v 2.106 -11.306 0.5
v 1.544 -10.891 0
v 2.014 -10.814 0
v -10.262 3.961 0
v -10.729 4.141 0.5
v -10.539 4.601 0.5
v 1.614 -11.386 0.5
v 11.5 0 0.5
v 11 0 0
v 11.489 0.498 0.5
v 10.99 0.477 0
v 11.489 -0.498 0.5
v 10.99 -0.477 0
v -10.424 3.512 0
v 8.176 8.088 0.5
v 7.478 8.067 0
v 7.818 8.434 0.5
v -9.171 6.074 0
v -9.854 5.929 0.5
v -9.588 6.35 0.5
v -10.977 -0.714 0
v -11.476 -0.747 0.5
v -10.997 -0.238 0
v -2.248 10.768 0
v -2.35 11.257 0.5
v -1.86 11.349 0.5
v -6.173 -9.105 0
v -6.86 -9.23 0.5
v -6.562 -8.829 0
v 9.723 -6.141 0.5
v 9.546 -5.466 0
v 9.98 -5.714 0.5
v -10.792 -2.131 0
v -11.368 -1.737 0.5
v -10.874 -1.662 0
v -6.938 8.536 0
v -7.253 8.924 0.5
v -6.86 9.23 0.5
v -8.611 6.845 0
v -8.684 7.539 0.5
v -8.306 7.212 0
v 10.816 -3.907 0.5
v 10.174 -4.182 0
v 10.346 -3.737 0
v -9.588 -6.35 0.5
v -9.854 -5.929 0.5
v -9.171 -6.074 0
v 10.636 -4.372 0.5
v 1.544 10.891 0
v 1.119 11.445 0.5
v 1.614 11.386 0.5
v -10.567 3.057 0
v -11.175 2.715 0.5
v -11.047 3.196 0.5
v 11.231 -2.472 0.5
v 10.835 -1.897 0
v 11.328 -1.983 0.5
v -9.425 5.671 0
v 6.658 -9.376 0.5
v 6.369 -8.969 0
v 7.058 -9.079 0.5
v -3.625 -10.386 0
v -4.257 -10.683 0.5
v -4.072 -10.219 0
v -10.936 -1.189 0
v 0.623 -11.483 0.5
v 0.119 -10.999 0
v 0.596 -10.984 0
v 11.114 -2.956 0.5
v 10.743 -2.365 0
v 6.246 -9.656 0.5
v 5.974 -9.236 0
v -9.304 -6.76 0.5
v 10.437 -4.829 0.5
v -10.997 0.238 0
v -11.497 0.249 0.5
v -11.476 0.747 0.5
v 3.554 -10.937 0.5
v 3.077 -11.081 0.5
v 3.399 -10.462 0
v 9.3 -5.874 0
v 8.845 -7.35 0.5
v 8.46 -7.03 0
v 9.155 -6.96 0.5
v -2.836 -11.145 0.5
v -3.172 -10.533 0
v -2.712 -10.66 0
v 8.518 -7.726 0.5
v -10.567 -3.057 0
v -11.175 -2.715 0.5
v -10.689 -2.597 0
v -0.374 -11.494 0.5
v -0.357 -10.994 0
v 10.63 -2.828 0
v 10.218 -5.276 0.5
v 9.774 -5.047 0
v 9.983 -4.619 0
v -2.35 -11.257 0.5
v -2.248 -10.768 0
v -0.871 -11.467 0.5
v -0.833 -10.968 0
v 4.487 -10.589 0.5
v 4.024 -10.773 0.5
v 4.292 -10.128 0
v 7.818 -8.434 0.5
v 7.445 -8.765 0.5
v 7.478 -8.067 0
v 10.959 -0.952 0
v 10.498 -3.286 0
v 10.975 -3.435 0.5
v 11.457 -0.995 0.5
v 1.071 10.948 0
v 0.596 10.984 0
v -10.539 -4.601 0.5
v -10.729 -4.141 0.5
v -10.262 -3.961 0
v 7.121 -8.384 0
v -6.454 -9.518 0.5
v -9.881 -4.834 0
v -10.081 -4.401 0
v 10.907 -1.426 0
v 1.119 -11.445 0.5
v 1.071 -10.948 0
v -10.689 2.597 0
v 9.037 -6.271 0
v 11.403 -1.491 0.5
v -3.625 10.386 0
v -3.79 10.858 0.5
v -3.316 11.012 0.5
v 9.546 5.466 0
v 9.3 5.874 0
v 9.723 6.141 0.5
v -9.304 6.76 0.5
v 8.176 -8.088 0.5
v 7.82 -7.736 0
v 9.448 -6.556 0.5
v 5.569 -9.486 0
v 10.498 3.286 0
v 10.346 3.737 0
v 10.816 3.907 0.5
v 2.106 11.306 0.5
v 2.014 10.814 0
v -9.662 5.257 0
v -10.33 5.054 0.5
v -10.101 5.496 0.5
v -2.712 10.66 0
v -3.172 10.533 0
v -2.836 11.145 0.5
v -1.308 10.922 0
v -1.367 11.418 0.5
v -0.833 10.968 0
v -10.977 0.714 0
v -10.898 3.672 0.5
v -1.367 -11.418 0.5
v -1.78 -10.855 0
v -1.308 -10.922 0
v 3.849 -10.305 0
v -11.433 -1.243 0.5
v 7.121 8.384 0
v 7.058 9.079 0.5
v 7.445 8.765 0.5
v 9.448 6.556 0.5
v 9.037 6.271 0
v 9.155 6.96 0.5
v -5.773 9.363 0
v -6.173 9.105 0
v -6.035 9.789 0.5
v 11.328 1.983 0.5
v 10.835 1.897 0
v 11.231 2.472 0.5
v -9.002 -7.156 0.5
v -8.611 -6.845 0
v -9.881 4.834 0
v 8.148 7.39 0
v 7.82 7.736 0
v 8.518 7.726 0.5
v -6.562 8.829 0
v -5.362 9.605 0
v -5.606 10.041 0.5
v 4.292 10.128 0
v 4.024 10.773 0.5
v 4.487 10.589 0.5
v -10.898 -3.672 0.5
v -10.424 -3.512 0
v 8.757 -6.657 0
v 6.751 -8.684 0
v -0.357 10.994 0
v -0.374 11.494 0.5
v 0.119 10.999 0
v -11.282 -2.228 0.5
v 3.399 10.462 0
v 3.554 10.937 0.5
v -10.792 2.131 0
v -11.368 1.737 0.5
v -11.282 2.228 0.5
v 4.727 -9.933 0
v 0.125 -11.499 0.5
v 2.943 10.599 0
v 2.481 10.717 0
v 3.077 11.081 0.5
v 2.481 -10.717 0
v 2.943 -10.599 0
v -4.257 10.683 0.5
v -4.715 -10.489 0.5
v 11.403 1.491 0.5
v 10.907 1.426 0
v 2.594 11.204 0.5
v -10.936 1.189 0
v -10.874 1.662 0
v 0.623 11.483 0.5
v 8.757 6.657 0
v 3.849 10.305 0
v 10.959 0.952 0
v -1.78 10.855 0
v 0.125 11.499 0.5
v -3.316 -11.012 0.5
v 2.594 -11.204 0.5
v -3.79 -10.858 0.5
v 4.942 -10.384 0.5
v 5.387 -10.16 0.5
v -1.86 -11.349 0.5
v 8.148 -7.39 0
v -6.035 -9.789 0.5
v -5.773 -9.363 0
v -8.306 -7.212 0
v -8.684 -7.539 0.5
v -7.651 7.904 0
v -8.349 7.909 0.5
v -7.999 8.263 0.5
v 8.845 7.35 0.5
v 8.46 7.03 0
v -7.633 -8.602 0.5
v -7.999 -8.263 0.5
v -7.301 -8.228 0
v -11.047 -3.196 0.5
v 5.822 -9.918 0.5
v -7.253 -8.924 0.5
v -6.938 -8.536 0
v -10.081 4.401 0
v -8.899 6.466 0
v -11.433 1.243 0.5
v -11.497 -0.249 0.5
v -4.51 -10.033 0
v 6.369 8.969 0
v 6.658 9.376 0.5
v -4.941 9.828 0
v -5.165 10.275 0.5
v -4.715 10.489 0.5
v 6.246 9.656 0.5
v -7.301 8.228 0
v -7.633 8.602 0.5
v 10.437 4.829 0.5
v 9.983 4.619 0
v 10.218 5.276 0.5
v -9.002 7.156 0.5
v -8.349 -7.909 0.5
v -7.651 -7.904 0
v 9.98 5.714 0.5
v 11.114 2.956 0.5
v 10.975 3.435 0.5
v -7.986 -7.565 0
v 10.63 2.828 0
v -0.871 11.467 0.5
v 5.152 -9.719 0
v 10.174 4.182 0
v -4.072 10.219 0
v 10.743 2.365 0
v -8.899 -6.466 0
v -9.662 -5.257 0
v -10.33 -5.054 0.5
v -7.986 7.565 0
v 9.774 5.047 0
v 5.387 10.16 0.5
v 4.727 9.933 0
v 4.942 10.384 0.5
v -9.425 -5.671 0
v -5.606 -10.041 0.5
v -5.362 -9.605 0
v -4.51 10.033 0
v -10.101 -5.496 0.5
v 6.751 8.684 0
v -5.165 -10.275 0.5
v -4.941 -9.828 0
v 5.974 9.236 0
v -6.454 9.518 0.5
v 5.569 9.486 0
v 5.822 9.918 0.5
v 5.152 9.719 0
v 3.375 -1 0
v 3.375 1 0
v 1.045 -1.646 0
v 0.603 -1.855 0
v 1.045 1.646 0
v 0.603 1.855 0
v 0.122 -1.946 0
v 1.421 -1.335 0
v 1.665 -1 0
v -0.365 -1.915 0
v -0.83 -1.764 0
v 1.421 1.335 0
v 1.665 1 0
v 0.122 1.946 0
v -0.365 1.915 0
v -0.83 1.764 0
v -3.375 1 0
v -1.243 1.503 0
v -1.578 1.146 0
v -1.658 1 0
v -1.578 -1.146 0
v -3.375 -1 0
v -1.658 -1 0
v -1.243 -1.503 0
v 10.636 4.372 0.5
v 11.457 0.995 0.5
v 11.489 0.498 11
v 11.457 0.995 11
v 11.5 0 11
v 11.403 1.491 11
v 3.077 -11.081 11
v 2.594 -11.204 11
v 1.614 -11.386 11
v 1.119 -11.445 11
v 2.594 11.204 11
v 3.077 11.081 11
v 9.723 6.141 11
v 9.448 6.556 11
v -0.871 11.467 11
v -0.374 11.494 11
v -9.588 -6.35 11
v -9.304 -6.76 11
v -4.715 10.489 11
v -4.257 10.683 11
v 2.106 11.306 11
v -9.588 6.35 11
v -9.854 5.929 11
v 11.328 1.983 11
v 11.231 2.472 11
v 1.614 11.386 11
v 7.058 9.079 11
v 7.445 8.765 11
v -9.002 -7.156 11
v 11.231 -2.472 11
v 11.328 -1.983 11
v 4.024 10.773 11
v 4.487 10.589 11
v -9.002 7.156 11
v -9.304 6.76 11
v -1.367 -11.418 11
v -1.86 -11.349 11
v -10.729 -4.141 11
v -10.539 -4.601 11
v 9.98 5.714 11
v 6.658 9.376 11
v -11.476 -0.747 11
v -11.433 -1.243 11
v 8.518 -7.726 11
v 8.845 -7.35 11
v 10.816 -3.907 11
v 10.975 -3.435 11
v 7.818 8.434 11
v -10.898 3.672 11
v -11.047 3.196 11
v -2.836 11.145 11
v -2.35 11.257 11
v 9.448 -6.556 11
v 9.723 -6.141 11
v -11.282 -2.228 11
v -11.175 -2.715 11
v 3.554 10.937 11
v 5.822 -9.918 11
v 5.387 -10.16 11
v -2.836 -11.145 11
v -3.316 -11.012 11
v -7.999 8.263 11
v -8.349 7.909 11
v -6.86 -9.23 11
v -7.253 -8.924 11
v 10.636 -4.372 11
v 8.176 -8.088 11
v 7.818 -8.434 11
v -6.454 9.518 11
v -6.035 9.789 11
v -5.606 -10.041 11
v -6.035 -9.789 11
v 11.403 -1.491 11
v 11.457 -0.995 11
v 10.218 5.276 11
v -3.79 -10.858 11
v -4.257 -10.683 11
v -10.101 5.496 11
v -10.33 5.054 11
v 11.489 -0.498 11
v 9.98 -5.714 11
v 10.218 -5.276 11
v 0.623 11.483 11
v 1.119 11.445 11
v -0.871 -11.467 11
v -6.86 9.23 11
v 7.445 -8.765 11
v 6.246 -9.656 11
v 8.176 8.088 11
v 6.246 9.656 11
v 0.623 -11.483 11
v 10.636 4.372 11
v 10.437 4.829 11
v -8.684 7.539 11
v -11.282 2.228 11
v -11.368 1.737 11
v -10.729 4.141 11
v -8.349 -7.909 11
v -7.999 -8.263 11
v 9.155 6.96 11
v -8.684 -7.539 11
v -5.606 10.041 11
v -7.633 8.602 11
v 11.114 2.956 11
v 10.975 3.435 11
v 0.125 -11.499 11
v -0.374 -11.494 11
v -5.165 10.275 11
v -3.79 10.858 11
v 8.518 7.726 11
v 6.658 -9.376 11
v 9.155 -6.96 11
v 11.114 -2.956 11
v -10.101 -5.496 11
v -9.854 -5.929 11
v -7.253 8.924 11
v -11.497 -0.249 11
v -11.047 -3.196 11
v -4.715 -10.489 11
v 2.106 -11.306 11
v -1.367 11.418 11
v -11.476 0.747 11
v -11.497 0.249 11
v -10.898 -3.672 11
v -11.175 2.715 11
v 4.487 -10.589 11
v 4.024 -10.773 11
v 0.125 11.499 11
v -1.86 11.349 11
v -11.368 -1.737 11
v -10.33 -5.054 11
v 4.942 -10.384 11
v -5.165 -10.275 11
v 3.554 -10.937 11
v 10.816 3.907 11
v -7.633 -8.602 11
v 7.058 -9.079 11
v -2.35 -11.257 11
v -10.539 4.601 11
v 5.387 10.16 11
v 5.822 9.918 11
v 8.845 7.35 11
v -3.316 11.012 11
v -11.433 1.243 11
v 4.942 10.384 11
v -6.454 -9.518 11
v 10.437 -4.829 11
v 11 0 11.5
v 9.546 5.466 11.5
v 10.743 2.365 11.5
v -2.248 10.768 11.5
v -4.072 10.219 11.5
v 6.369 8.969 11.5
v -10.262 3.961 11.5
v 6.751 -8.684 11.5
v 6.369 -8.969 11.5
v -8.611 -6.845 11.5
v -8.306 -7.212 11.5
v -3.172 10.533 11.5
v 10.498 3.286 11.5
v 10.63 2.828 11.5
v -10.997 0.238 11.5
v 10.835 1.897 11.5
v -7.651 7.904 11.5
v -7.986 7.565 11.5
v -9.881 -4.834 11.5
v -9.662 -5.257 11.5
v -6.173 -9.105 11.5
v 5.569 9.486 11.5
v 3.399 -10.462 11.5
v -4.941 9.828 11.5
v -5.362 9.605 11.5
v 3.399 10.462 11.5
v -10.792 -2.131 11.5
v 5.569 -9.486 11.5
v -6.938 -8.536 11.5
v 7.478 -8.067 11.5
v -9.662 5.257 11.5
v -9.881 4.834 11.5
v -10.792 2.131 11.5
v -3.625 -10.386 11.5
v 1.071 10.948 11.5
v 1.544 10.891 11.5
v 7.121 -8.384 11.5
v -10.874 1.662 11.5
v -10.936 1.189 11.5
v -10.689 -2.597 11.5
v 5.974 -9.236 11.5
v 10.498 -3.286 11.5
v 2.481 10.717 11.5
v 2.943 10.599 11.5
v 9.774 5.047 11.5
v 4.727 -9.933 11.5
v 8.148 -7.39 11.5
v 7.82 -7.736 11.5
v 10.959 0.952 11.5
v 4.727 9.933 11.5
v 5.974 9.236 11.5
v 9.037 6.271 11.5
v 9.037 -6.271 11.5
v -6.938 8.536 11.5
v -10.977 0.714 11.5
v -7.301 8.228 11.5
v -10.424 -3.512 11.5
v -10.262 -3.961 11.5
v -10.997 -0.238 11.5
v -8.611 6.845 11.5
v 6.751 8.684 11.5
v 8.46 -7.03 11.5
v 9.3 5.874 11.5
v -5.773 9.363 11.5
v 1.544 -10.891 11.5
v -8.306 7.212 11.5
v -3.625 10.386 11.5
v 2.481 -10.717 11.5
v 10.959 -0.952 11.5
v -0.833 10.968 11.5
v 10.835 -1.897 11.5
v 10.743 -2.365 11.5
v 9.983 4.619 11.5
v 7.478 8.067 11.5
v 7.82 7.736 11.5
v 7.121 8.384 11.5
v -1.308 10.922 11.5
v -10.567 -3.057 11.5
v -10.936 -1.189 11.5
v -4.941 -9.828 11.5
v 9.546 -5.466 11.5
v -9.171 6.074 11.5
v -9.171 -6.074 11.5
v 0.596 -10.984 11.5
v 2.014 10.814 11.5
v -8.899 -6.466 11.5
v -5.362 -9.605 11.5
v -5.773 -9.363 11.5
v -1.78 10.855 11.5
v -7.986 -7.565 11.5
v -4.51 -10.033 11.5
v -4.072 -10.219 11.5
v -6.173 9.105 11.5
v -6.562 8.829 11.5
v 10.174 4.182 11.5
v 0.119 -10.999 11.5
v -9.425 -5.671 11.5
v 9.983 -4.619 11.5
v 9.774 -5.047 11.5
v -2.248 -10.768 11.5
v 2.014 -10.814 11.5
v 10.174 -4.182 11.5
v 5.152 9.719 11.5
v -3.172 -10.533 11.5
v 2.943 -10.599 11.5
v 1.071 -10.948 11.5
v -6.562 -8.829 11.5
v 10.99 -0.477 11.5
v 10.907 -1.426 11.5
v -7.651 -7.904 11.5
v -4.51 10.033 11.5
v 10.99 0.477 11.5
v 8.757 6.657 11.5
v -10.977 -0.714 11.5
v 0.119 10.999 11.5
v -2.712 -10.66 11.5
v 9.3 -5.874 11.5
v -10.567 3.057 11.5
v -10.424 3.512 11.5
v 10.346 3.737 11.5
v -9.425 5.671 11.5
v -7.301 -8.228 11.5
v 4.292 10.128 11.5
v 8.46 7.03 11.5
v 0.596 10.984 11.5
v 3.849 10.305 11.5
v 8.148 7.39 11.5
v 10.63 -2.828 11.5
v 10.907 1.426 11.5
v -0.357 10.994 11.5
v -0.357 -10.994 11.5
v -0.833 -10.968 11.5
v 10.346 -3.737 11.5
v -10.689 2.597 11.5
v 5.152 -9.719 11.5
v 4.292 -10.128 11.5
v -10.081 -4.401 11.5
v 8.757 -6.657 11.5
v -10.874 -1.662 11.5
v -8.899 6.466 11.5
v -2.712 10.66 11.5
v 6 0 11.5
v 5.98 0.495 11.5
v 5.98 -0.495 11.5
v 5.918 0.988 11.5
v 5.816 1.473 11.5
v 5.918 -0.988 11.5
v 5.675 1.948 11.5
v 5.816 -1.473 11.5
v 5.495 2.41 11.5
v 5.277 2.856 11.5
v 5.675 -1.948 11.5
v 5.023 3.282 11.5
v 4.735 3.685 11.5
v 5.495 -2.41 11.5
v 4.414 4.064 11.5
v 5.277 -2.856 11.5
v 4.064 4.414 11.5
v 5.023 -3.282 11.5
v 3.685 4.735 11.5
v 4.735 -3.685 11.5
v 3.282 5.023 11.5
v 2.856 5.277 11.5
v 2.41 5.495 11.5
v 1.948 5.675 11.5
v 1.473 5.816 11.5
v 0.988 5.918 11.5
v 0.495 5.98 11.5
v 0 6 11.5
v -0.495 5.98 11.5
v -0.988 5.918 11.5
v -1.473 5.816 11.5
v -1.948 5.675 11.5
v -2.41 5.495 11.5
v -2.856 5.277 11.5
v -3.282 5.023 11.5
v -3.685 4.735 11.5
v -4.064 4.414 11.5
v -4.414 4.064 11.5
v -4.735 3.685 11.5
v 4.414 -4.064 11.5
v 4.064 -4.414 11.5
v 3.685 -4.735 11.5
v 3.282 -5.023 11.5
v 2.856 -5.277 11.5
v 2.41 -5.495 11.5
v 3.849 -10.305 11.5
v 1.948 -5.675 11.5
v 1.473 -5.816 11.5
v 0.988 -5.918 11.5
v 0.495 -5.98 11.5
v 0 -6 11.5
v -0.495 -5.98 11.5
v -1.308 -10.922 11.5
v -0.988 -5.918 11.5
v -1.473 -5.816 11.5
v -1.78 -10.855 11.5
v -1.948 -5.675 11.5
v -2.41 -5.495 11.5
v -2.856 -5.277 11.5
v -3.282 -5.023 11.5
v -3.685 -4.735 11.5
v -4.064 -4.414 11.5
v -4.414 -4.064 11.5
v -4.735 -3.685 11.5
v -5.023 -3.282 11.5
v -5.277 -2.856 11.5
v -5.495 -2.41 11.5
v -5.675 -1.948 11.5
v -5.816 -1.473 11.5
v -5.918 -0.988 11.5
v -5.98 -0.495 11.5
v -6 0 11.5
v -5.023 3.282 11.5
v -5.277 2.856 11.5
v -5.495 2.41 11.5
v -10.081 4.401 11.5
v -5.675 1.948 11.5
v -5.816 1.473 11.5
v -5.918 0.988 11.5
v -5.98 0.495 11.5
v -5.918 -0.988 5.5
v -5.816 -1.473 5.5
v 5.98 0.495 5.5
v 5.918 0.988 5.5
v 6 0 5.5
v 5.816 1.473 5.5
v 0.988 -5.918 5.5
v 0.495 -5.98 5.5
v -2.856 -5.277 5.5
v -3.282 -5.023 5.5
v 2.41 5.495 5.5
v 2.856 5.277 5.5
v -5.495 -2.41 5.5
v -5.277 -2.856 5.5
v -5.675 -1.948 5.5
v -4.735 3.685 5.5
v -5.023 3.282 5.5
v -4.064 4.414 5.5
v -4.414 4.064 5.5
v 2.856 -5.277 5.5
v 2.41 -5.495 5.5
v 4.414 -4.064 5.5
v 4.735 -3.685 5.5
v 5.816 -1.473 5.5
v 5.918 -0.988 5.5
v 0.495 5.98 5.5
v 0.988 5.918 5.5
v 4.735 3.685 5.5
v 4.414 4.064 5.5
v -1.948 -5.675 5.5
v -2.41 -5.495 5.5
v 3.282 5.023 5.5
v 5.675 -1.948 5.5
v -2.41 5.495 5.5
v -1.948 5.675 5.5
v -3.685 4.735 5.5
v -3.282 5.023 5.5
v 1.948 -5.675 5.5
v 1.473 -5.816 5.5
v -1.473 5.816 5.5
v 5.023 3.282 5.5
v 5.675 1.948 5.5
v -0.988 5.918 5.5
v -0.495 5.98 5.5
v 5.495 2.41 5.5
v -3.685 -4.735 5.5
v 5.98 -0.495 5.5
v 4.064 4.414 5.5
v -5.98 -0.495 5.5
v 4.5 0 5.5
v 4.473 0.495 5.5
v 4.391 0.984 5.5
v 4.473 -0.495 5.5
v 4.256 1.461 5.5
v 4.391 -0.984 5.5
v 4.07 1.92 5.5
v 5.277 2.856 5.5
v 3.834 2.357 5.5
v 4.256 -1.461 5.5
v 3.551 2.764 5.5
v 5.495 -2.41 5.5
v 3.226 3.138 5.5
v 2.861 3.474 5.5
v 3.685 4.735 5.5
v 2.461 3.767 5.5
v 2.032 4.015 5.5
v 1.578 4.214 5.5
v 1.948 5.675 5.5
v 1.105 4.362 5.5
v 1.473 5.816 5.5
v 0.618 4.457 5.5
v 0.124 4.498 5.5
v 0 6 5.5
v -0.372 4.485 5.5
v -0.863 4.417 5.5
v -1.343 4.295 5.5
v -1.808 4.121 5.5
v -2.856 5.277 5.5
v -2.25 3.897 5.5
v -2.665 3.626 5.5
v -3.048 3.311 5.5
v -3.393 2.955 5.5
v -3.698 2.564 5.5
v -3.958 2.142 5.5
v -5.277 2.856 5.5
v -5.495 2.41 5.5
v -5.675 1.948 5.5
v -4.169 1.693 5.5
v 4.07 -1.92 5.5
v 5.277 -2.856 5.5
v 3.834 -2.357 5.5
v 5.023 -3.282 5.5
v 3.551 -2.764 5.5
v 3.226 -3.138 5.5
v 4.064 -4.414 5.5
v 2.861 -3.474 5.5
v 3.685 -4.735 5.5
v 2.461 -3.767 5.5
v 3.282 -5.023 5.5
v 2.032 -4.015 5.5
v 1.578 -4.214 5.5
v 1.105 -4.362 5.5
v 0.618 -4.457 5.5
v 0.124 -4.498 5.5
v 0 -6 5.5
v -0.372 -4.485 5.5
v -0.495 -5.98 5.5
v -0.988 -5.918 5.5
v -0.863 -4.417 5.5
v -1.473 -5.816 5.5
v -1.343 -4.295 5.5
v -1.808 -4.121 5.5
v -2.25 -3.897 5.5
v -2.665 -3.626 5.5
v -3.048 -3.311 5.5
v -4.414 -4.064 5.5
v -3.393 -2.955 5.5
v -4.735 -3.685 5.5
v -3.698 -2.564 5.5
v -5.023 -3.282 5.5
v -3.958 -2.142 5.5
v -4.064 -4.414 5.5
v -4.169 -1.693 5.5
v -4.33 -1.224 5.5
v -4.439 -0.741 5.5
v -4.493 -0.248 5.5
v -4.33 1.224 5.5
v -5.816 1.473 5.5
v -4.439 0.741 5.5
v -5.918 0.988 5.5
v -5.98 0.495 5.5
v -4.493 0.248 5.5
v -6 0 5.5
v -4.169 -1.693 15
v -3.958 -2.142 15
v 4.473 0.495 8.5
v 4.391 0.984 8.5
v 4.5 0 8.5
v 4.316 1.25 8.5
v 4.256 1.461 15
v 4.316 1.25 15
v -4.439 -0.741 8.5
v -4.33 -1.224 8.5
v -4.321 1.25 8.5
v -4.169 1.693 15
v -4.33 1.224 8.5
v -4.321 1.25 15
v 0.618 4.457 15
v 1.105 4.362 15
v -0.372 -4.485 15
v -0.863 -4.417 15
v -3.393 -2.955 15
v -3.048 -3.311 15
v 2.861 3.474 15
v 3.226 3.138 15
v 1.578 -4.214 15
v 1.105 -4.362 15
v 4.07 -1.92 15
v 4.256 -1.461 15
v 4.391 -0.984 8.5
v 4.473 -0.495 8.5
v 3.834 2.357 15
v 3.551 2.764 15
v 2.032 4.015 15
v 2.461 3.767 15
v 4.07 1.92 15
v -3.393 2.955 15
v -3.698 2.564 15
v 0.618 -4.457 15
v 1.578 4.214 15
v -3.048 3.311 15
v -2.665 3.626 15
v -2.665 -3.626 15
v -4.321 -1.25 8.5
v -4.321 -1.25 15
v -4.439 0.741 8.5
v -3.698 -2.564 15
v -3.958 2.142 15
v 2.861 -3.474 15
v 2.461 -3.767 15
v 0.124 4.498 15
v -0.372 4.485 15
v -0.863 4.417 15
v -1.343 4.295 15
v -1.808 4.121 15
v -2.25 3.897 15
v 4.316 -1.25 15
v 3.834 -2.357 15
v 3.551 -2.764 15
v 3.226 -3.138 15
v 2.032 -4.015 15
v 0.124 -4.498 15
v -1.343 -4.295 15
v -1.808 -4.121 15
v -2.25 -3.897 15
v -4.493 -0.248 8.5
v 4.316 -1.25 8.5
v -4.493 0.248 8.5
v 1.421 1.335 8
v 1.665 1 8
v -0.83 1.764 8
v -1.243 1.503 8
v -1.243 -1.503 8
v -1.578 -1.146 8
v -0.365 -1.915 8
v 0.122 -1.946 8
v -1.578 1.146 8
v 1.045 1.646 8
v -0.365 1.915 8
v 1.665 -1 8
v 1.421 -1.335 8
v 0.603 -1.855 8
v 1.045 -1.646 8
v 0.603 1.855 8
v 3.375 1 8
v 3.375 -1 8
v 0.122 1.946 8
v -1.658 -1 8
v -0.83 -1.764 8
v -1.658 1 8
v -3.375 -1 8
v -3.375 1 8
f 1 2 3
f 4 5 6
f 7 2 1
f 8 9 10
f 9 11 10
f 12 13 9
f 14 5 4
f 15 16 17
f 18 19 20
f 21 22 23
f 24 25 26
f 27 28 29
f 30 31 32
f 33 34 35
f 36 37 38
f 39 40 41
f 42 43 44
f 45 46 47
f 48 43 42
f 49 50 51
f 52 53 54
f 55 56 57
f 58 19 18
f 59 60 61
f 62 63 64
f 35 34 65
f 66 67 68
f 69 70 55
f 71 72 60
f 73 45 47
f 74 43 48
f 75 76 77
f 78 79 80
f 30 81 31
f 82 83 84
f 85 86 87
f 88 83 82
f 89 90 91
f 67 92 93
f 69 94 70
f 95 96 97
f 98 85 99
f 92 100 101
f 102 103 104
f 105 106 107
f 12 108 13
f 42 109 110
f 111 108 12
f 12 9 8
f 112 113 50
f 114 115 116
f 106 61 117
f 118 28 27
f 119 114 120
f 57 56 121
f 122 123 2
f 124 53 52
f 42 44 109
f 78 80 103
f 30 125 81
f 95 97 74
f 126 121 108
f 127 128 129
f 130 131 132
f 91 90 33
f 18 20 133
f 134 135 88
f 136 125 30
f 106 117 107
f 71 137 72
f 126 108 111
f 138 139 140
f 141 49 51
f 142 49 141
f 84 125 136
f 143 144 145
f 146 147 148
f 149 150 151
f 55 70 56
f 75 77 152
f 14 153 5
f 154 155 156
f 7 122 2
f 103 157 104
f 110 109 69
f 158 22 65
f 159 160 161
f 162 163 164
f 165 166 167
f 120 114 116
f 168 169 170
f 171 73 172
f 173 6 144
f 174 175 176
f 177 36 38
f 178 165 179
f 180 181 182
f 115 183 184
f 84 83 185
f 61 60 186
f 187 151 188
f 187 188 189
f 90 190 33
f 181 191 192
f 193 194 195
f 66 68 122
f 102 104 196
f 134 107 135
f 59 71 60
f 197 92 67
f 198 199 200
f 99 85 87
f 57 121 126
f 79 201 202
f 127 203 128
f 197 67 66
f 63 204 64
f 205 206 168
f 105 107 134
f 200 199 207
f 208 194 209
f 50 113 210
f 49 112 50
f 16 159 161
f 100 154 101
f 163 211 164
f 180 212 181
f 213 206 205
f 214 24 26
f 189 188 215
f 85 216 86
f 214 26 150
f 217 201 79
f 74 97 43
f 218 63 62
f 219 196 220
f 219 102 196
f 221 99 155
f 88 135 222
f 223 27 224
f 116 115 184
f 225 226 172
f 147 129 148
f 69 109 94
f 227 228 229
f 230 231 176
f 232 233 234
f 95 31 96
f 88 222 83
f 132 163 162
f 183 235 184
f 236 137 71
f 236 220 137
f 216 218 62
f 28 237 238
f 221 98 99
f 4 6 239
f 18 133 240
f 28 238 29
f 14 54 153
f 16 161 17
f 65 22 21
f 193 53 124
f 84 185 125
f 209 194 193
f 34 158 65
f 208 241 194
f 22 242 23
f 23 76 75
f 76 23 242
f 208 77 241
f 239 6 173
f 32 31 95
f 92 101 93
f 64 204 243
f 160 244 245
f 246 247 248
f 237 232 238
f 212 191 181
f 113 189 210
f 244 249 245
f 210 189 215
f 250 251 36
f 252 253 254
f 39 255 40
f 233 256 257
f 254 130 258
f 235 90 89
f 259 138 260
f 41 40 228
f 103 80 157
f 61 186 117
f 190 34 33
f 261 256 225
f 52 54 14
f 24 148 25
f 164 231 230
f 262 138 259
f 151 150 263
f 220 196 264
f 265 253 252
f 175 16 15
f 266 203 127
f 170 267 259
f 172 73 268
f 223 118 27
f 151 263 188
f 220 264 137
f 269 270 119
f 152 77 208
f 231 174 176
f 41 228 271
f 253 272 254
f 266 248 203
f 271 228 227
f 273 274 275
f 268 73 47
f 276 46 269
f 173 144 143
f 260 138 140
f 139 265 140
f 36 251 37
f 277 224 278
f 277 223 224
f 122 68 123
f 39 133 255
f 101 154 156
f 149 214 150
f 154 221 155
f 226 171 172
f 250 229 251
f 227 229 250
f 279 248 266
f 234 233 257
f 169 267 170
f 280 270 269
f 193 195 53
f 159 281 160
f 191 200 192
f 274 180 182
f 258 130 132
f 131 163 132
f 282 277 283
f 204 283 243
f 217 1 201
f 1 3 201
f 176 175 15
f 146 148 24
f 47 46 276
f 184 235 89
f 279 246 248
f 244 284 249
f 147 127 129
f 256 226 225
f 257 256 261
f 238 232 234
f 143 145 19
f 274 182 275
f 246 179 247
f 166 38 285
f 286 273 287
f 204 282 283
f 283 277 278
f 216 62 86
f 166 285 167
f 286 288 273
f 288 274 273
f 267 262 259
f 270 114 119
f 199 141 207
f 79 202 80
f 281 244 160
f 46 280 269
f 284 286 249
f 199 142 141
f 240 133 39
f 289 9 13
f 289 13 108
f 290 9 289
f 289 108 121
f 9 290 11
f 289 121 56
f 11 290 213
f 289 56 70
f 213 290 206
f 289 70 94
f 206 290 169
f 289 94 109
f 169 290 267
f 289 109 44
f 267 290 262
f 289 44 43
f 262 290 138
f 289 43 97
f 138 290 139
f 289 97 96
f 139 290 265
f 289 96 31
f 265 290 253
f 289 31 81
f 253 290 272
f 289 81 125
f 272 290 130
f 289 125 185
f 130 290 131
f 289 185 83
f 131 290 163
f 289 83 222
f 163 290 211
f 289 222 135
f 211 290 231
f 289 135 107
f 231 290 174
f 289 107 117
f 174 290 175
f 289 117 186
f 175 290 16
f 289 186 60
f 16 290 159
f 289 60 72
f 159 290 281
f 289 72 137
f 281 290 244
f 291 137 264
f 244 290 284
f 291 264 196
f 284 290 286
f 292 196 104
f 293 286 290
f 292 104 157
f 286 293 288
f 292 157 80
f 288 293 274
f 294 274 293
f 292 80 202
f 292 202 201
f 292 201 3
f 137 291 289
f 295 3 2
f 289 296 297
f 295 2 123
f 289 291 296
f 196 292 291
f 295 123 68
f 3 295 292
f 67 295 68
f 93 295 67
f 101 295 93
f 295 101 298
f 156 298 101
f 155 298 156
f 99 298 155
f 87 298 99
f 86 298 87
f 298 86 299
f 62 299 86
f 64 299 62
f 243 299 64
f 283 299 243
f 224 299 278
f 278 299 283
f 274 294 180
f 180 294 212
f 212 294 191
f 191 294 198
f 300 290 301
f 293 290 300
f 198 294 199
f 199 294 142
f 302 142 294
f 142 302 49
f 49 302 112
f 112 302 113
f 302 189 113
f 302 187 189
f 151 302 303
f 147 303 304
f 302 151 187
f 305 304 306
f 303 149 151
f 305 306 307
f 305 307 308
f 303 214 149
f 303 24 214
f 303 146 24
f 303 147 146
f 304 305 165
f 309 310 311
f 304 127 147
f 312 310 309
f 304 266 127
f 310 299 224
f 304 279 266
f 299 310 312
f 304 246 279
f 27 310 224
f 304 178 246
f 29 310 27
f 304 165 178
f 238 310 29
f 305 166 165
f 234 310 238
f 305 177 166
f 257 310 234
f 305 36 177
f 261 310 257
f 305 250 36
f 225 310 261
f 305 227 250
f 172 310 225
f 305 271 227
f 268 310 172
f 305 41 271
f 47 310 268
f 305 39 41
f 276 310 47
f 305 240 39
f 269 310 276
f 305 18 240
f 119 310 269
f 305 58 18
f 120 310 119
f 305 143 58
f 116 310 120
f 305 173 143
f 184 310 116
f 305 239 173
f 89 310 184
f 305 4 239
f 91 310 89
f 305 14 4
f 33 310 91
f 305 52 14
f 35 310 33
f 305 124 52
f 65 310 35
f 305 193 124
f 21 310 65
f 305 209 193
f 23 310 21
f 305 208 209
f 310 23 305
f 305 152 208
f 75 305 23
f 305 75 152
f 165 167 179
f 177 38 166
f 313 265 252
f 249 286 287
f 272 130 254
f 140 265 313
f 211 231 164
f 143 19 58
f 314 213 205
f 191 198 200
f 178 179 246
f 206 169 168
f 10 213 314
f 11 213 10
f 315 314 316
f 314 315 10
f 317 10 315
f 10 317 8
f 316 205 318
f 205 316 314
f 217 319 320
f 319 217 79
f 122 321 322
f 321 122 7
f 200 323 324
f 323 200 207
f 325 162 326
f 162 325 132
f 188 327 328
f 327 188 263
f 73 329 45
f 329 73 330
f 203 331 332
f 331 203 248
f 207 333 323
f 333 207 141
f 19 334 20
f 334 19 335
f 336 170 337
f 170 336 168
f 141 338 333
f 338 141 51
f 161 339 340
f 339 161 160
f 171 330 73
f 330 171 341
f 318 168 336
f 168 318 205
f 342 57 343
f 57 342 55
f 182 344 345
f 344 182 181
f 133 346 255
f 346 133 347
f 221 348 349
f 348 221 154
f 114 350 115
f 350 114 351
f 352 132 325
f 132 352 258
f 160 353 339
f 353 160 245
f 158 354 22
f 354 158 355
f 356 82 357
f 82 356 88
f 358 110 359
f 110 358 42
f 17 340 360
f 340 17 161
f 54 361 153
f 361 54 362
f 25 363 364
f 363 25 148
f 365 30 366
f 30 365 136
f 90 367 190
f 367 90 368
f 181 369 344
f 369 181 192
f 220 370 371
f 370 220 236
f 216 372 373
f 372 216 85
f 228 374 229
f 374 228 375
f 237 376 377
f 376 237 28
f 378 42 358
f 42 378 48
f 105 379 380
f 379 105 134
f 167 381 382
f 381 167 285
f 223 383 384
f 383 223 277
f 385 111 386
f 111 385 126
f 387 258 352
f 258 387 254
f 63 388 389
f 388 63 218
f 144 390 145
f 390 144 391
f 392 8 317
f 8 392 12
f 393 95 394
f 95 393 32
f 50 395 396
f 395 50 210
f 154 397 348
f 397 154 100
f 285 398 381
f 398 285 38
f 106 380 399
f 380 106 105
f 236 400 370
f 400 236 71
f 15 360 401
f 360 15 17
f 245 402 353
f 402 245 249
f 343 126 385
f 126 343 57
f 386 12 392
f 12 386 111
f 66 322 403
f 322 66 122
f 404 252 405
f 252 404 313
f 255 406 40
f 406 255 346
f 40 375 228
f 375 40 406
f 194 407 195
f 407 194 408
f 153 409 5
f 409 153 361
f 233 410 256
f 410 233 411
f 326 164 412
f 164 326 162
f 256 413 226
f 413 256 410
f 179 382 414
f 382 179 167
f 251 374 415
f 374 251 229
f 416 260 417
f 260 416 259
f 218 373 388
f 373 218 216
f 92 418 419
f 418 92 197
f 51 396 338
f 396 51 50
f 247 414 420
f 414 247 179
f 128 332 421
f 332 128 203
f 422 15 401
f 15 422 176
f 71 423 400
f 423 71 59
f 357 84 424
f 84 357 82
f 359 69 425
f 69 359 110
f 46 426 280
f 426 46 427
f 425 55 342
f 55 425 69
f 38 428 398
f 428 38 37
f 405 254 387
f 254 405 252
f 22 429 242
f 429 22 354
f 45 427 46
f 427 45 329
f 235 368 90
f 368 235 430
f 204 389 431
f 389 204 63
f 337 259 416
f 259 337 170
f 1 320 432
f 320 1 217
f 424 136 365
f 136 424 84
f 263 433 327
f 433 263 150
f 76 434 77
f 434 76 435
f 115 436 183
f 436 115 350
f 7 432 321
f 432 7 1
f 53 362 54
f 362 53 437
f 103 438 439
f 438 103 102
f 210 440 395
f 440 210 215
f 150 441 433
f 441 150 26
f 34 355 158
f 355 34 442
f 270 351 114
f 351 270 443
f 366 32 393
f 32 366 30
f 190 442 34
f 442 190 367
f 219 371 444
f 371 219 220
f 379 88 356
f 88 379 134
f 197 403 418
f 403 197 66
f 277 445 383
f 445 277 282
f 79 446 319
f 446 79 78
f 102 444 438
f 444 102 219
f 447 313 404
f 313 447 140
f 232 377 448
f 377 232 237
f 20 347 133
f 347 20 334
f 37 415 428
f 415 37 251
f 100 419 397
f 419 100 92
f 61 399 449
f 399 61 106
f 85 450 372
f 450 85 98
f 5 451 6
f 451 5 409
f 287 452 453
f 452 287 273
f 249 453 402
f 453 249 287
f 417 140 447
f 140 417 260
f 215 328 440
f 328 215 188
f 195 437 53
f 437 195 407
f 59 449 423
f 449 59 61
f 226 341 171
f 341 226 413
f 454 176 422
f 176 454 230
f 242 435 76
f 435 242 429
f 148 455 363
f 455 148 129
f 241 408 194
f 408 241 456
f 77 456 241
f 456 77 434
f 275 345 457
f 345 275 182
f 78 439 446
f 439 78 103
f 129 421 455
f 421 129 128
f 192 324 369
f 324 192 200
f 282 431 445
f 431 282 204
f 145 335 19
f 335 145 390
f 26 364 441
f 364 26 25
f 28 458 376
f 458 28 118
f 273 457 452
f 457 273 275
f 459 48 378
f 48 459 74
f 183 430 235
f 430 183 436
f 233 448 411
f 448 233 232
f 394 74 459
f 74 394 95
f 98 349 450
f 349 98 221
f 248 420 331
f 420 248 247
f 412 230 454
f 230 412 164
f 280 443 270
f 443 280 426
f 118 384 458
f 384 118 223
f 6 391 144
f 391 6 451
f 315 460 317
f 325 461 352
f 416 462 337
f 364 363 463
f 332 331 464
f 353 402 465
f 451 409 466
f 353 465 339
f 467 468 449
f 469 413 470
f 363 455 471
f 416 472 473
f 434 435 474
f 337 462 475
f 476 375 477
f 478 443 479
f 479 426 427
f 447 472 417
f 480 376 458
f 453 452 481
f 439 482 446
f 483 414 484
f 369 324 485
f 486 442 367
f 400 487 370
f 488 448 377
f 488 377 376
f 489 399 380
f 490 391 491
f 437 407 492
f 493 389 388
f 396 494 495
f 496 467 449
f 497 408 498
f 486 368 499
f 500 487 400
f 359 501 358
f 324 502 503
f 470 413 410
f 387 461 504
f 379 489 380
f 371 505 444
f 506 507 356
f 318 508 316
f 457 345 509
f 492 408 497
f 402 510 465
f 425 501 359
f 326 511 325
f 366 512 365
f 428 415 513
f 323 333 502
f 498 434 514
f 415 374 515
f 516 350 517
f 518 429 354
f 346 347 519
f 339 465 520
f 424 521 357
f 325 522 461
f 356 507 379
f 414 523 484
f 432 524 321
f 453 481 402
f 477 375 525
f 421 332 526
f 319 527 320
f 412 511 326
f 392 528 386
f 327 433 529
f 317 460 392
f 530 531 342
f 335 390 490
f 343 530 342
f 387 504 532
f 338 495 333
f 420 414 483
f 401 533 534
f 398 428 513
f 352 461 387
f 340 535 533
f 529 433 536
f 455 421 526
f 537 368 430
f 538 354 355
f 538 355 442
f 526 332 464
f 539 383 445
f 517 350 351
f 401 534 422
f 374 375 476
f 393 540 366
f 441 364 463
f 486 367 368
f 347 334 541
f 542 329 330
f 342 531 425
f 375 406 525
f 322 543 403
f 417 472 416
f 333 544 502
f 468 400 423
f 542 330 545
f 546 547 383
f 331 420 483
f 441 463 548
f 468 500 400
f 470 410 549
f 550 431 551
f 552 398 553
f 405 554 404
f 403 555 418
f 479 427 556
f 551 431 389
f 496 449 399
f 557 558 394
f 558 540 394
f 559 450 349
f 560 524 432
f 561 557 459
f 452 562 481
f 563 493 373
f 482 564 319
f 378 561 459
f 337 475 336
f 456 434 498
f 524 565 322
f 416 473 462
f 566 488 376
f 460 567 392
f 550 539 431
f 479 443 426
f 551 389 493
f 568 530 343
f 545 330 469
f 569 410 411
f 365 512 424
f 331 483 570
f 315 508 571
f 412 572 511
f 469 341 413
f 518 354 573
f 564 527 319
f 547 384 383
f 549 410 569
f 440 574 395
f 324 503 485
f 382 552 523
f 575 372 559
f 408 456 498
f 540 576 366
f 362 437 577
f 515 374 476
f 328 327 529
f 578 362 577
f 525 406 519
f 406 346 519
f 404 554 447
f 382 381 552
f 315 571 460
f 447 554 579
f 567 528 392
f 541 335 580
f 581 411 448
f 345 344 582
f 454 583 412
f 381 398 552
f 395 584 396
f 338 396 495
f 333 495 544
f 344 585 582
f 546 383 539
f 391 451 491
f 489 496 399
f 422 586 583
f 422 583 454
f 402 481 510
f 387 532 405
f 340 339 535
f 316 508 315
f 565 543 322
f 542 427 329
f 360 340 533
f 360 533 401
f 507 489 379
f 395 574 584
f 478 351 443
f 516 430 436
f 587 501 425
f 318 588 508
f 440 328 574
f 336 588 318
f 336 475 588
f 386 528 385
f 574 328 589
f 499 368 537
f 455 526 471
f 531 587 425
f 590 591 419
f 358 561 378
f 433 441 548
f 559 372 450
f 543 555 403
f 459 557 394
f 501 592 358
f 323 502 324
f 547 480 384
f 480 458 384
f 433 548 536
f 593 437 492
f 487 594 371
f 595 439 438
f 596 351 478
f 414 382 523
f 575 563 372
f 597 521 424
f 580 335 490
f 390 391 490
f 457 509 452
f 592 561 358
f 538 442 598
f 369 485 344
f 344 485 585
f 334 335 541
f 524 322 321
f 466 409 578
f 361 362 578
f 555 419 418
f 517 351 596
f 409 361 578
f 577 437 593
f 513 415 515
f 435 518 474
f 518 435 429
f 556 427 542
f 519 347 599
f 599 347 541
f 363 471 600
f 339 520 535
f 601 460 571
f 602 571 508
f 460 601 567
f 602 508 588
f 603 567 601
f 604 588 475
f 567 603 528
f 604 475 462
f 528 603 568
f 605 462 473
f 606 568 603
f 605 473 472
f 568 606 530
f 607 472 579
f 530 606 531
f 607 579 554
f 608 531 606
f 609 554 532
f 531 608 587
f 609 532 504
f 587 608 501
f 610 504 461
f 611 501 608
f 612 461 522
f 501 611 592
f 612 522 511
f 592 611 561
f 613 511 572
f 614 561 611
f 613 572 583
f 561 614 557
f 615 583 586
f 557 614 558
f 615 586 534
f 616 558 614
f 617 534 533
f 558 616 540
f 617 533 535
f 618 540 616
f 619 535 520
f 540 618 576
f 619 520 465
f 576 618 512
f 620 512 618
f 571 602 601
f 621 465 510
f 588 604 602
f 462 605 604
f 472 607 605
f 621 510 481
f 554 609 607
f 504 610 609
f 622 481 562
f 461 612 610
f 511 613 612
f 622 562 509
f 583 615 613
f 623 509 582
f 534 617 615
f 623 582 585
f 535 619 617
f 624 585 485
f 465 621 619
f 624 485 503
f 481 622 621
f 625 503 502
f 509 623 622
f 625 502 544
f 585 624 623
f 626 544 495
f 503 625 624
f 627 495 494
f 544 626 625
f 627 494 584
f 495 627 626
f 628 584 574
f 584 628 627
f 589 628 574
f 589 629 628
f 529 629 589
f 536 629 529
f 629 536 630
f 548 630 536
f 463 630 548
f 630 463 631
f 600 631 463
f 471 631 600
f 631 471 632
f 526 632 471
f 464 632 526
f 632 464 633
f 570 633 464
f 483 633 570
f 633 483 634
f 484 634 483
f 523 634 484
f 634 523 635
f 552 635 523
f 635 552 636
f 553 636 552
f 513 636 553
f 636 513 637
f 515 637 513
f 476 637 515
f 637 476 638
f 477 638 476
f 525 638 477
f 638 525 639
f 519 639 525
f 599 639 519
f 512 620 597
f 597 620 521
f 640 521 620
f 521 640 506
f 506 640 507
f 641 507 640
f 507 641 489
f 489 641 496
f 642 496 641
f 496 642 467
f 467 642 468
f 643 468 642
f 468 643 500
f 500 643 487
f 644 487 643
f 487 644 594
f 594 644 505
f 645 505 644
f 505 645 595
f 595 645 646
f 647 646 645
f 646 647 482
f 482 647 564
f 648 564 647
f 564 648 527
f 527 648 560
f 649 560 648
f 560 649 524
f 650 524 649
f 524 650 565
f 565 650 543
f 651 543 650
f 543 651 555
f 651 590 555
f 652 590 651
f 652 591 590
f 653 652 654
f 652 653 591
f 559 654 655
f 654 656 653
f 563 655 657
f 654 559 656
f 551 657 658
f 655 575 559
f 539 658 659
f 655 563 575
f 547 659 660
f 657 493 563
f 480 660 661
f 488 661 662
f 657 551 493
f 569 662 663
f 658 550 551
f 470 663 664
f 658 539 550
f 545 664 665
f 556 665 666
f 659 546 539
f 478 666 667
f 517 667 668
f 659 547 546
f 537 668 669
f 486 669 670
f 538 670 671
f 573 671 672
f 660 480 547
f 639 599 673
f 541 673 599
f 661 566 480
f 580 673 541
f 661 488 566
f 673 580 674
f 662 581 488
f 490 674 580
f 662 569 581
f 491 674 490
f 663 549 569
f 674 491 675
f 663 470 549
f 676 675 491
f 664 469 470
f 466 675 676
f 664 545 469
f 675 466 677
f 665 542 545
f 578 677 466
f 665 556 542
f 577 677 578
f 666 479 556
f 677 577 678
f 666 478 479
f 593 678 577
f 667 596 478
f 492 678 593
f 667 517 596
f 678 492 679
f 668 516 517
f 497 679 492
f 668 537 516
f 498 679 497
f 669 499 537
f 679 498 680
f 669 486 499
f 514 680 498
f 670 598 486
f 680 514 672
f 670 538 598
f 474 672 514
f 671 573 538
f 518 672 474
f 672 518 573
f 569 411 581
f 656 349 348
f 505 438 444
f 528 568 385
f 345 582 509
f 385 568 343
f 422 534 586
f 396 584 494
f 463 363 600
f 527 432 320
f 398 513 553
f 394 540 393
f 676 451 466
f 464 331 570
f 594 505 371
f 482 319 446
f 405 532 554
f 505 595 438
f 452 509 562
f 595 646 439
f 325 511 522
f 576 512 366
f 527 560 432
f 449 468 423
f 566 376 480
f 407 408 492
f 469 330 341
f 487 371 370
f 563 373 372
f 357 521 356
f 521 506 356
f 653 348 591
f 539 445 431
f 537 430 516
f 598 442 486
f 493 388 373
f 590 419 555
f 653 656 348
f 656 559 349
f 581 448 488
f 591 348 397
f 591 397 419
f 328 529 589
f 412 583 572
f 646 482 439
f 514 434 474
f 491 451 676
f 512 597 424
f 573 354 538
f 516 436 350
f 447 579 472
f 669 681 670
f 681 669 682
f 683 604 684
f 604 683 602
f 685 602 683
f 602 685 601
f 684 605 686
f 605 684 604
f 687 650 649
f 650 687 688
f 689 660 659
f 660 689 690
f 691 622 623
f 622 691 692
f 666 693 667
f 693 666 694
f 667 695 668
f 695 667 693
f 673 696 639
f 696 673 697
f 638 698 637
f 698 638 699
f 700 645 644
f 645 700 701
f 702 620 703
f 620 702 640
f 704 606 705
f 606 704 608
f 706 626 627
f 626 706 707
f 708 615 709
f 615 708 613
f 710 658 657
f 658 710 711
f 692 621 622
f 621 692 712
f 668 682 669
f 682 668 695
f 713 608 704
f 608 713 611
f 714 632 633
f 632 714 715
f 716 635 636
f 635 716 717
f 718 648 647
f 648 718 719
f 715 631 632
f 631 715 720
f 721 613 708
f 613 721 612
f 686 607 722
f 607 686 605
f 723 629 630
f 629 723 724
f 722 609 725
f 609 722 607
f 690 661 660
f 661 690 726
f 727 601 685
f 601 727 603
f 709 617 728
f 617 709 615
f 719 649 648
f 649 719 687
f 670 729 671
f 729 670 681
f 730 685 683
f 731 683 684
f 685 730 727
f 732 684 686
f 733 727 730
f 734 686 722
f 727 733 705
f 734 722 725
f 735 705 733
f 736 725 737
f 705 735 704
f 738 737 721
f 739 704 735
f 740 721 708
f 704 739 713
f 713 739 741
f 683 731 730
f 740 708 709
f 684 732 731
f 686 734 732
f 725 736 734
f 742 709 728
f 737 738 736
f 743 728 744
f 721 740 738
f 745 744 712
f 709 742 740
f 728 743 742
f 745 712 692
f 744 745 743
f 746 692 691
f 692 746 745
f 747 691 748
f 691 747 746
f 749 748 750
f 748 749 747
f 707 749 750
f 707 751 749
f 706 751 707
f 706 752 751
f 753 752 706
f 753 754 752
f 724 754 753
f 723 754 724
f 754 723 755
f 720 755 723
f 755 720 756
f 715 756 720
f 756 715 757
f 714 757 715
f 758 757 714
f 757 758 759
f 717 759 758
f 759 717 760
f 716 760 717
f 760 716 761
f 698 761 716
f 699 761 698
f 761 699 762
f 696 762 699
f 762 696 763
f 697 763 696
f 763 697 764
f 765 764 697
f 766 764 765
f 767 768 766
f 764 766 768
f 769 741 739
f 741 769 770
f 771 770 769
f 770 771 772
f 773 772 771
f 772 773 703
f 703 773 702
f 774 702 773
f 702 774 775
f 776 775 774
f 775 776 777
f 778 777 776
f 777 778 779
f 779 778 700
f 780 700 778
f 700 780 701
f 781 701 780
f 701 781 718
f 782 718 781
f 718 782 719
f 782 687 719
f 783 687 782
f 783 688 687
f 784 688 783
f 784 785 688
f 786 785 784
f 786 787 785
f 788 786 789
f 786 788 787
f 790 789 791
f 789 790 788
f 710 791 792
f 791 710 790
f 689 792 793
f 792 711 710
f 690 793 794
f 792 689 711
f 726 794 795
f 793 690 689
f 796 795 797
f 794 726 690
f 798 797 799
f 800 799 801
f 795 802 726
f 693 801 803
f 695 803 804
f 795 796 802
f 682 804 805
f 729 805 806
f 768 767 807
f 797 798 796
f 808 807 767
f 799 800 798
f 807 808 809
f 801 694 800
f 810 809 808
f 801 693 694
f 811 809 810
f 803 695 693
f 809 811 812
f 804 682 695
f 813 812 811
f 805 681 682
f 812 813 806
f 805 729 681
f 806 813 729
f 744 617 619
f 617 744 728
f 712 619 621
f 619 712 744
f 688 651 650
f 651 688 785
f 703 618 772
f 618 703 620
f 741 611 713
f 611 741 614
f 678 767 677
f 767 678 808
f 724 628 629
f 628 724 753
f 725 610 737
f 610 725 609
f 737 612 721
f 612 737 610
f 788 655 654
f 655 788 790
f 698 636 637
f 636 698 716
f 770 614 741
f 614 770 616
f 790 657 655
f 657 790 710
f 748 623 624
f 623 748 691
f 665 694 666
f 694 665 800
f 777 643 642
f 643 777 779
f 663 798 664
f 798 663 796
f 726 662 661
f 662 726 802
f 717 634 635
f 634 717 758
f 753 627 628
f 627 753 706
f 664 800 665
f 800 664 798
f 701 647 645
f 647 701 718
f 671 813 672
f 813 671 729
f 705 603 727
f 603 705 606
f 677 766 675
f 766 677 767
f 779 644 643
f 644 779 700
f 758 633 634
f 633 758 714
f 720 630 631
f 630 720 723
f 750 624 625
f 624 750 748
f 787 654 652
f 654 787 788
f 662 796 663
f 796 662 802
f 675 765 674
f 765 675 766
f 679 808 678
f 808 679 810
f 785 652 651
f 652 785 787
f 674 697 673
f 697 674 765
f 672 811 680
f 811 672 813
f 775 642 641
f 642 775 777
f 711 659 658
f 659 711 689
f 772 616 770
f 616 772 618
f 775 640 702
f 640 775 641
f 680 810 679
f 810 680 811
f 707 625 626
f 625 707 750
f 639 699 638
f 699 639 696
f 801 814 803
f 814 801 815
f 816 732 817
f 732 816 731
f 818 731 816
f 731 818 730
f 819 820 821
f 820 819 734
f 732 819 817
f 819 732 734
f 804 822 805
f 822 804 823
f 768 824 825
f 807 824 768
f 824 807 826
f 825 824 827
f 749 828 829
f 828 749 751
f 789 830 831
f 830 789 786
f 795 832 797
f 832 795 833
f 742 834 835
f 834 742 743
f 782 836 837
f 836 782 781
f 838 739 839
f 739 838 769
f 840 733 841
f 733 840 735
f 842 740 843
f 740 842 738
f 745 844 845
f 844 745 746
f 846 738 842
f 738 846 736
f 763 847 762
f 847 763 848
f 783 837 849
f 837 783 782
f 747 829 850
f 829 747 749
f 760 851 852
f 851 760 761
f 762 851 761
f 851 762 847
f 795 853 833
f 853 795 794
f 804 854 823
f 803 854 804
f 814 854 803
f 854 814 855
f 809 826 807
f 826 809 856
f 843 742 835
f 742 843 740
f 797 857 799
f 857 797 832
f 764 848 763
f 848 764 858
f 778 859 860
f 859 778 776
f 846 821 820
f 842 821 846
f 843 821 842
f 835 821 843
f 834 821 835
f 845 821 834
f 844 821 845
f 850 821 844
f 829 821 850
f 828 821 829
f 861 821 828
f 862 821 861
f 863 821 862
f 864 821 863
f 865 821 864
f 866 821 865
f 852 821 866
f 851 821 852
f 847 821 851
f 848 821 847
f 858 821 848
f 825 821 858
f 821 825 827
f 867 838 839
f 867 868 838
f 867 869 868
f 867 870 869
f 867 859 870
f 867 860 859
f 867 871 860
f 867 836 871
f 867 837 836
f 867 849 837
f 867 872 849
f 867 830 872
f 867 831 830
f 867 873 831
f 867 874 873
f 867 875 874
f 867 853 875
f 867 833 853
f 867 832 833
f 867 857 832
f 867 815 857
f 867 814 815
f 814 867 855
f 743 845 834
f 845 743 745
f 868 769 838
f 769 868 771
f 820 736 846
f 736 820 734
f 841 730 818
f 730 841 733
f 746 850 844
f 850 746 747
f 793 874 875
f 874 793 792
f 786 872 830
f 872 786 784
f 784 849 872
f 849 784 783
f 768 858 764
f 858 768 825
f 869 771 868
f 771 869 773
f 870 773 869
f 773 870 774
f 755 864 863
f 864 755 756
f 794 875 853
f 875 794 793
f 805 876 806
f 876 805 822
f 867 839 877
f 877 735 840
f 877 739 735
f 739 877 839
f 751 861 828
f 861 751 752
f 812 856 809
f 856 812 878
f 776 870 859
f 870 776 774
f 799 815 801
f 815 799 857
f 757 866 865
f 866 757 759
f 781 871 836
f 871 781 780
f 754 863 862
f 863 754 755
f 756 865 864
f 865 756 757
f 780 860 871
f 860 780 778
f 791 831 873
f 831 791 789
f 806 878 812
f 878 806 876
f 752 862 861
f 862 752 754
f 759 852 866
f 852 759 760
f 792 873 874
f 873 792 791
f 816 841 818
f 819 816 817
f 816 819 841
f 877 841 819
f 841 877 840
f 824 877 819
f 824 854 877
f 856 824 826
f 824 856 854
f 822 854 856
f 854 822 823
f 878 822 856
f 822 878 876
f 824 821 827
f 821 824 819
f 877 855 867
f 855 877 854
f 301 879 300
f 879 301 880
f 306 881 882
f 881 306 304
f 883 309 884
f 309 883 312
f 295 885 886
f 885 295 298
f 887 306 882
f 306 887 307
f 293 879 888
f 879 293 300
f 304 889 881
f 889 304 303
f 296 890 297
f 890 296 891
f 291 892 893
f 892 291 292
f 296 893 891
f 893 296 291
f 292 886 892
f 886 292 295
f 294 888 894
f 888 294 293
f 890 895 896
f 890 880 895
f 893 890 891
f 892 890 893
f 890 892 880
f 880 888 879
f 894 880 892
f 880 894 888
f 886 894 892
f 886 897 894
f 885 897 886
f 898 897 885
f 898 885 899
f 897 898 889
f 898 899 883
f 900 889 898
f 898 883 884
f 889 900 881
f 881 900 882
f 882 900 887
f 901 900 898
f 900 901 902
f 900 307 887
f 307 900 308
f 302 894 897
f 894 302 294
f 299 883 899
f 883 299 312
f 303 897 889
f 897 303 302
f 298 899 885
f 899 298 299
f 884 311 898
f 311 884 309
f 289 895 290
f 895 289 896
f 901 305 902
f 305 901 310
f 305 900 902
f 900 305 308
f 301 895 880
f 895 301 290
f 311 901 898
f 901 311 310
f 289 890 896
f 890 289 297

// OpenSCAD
od1=23/2 ; //baseouter diamter
h1=11.5 ; //base height
od2 = 9/2 ; //shaft diameter
h2= 15; //shaft height
dr=0.1;
x1 = 10 ;
y1 = 2.5 ;
z1= 6.5;
h3 = 6;
od3 = 12/2;
x2=6.75;
y2=2;

pind=3.9/2;
chamfer=0.5;
difference(){
difference()
{
   union(){ 
    difference()
       {
        union(){
           cylinder (chamfer,  od1-chamfer , od1 , false,$fa=1, $fs=0.5);   
            translate([0,0,chamfer]) cylinder (h1-2*chamfer,  od1 , od1 , false,$fa=1, $fs=0.5);
        translate([0,0,h1-chamfer]) cylinder (chamfer,  od1 , od1-chamfer , false,$fa=1, $fs=0.5);
        }
       translate([0,0,h1-h3]) cylinder (h3,  od3 , od3 , false,$fa=1, $fs=0.5);
        }
       
        cylinder (h2,  od2 , od2 , false,$fa=1, $fs=0.5);
   }
   
    translate ( [-x1/2 , -y1/2 ,h2-z1])  cube([x1,y1,z1]);

}
union(){
cylinder (8,pind,pind, false,$fa=1, $fs=0.5);
translate ( [-x2/2 , -y2/2 ,0]) cube([x2,y2,8]);
    }
}
